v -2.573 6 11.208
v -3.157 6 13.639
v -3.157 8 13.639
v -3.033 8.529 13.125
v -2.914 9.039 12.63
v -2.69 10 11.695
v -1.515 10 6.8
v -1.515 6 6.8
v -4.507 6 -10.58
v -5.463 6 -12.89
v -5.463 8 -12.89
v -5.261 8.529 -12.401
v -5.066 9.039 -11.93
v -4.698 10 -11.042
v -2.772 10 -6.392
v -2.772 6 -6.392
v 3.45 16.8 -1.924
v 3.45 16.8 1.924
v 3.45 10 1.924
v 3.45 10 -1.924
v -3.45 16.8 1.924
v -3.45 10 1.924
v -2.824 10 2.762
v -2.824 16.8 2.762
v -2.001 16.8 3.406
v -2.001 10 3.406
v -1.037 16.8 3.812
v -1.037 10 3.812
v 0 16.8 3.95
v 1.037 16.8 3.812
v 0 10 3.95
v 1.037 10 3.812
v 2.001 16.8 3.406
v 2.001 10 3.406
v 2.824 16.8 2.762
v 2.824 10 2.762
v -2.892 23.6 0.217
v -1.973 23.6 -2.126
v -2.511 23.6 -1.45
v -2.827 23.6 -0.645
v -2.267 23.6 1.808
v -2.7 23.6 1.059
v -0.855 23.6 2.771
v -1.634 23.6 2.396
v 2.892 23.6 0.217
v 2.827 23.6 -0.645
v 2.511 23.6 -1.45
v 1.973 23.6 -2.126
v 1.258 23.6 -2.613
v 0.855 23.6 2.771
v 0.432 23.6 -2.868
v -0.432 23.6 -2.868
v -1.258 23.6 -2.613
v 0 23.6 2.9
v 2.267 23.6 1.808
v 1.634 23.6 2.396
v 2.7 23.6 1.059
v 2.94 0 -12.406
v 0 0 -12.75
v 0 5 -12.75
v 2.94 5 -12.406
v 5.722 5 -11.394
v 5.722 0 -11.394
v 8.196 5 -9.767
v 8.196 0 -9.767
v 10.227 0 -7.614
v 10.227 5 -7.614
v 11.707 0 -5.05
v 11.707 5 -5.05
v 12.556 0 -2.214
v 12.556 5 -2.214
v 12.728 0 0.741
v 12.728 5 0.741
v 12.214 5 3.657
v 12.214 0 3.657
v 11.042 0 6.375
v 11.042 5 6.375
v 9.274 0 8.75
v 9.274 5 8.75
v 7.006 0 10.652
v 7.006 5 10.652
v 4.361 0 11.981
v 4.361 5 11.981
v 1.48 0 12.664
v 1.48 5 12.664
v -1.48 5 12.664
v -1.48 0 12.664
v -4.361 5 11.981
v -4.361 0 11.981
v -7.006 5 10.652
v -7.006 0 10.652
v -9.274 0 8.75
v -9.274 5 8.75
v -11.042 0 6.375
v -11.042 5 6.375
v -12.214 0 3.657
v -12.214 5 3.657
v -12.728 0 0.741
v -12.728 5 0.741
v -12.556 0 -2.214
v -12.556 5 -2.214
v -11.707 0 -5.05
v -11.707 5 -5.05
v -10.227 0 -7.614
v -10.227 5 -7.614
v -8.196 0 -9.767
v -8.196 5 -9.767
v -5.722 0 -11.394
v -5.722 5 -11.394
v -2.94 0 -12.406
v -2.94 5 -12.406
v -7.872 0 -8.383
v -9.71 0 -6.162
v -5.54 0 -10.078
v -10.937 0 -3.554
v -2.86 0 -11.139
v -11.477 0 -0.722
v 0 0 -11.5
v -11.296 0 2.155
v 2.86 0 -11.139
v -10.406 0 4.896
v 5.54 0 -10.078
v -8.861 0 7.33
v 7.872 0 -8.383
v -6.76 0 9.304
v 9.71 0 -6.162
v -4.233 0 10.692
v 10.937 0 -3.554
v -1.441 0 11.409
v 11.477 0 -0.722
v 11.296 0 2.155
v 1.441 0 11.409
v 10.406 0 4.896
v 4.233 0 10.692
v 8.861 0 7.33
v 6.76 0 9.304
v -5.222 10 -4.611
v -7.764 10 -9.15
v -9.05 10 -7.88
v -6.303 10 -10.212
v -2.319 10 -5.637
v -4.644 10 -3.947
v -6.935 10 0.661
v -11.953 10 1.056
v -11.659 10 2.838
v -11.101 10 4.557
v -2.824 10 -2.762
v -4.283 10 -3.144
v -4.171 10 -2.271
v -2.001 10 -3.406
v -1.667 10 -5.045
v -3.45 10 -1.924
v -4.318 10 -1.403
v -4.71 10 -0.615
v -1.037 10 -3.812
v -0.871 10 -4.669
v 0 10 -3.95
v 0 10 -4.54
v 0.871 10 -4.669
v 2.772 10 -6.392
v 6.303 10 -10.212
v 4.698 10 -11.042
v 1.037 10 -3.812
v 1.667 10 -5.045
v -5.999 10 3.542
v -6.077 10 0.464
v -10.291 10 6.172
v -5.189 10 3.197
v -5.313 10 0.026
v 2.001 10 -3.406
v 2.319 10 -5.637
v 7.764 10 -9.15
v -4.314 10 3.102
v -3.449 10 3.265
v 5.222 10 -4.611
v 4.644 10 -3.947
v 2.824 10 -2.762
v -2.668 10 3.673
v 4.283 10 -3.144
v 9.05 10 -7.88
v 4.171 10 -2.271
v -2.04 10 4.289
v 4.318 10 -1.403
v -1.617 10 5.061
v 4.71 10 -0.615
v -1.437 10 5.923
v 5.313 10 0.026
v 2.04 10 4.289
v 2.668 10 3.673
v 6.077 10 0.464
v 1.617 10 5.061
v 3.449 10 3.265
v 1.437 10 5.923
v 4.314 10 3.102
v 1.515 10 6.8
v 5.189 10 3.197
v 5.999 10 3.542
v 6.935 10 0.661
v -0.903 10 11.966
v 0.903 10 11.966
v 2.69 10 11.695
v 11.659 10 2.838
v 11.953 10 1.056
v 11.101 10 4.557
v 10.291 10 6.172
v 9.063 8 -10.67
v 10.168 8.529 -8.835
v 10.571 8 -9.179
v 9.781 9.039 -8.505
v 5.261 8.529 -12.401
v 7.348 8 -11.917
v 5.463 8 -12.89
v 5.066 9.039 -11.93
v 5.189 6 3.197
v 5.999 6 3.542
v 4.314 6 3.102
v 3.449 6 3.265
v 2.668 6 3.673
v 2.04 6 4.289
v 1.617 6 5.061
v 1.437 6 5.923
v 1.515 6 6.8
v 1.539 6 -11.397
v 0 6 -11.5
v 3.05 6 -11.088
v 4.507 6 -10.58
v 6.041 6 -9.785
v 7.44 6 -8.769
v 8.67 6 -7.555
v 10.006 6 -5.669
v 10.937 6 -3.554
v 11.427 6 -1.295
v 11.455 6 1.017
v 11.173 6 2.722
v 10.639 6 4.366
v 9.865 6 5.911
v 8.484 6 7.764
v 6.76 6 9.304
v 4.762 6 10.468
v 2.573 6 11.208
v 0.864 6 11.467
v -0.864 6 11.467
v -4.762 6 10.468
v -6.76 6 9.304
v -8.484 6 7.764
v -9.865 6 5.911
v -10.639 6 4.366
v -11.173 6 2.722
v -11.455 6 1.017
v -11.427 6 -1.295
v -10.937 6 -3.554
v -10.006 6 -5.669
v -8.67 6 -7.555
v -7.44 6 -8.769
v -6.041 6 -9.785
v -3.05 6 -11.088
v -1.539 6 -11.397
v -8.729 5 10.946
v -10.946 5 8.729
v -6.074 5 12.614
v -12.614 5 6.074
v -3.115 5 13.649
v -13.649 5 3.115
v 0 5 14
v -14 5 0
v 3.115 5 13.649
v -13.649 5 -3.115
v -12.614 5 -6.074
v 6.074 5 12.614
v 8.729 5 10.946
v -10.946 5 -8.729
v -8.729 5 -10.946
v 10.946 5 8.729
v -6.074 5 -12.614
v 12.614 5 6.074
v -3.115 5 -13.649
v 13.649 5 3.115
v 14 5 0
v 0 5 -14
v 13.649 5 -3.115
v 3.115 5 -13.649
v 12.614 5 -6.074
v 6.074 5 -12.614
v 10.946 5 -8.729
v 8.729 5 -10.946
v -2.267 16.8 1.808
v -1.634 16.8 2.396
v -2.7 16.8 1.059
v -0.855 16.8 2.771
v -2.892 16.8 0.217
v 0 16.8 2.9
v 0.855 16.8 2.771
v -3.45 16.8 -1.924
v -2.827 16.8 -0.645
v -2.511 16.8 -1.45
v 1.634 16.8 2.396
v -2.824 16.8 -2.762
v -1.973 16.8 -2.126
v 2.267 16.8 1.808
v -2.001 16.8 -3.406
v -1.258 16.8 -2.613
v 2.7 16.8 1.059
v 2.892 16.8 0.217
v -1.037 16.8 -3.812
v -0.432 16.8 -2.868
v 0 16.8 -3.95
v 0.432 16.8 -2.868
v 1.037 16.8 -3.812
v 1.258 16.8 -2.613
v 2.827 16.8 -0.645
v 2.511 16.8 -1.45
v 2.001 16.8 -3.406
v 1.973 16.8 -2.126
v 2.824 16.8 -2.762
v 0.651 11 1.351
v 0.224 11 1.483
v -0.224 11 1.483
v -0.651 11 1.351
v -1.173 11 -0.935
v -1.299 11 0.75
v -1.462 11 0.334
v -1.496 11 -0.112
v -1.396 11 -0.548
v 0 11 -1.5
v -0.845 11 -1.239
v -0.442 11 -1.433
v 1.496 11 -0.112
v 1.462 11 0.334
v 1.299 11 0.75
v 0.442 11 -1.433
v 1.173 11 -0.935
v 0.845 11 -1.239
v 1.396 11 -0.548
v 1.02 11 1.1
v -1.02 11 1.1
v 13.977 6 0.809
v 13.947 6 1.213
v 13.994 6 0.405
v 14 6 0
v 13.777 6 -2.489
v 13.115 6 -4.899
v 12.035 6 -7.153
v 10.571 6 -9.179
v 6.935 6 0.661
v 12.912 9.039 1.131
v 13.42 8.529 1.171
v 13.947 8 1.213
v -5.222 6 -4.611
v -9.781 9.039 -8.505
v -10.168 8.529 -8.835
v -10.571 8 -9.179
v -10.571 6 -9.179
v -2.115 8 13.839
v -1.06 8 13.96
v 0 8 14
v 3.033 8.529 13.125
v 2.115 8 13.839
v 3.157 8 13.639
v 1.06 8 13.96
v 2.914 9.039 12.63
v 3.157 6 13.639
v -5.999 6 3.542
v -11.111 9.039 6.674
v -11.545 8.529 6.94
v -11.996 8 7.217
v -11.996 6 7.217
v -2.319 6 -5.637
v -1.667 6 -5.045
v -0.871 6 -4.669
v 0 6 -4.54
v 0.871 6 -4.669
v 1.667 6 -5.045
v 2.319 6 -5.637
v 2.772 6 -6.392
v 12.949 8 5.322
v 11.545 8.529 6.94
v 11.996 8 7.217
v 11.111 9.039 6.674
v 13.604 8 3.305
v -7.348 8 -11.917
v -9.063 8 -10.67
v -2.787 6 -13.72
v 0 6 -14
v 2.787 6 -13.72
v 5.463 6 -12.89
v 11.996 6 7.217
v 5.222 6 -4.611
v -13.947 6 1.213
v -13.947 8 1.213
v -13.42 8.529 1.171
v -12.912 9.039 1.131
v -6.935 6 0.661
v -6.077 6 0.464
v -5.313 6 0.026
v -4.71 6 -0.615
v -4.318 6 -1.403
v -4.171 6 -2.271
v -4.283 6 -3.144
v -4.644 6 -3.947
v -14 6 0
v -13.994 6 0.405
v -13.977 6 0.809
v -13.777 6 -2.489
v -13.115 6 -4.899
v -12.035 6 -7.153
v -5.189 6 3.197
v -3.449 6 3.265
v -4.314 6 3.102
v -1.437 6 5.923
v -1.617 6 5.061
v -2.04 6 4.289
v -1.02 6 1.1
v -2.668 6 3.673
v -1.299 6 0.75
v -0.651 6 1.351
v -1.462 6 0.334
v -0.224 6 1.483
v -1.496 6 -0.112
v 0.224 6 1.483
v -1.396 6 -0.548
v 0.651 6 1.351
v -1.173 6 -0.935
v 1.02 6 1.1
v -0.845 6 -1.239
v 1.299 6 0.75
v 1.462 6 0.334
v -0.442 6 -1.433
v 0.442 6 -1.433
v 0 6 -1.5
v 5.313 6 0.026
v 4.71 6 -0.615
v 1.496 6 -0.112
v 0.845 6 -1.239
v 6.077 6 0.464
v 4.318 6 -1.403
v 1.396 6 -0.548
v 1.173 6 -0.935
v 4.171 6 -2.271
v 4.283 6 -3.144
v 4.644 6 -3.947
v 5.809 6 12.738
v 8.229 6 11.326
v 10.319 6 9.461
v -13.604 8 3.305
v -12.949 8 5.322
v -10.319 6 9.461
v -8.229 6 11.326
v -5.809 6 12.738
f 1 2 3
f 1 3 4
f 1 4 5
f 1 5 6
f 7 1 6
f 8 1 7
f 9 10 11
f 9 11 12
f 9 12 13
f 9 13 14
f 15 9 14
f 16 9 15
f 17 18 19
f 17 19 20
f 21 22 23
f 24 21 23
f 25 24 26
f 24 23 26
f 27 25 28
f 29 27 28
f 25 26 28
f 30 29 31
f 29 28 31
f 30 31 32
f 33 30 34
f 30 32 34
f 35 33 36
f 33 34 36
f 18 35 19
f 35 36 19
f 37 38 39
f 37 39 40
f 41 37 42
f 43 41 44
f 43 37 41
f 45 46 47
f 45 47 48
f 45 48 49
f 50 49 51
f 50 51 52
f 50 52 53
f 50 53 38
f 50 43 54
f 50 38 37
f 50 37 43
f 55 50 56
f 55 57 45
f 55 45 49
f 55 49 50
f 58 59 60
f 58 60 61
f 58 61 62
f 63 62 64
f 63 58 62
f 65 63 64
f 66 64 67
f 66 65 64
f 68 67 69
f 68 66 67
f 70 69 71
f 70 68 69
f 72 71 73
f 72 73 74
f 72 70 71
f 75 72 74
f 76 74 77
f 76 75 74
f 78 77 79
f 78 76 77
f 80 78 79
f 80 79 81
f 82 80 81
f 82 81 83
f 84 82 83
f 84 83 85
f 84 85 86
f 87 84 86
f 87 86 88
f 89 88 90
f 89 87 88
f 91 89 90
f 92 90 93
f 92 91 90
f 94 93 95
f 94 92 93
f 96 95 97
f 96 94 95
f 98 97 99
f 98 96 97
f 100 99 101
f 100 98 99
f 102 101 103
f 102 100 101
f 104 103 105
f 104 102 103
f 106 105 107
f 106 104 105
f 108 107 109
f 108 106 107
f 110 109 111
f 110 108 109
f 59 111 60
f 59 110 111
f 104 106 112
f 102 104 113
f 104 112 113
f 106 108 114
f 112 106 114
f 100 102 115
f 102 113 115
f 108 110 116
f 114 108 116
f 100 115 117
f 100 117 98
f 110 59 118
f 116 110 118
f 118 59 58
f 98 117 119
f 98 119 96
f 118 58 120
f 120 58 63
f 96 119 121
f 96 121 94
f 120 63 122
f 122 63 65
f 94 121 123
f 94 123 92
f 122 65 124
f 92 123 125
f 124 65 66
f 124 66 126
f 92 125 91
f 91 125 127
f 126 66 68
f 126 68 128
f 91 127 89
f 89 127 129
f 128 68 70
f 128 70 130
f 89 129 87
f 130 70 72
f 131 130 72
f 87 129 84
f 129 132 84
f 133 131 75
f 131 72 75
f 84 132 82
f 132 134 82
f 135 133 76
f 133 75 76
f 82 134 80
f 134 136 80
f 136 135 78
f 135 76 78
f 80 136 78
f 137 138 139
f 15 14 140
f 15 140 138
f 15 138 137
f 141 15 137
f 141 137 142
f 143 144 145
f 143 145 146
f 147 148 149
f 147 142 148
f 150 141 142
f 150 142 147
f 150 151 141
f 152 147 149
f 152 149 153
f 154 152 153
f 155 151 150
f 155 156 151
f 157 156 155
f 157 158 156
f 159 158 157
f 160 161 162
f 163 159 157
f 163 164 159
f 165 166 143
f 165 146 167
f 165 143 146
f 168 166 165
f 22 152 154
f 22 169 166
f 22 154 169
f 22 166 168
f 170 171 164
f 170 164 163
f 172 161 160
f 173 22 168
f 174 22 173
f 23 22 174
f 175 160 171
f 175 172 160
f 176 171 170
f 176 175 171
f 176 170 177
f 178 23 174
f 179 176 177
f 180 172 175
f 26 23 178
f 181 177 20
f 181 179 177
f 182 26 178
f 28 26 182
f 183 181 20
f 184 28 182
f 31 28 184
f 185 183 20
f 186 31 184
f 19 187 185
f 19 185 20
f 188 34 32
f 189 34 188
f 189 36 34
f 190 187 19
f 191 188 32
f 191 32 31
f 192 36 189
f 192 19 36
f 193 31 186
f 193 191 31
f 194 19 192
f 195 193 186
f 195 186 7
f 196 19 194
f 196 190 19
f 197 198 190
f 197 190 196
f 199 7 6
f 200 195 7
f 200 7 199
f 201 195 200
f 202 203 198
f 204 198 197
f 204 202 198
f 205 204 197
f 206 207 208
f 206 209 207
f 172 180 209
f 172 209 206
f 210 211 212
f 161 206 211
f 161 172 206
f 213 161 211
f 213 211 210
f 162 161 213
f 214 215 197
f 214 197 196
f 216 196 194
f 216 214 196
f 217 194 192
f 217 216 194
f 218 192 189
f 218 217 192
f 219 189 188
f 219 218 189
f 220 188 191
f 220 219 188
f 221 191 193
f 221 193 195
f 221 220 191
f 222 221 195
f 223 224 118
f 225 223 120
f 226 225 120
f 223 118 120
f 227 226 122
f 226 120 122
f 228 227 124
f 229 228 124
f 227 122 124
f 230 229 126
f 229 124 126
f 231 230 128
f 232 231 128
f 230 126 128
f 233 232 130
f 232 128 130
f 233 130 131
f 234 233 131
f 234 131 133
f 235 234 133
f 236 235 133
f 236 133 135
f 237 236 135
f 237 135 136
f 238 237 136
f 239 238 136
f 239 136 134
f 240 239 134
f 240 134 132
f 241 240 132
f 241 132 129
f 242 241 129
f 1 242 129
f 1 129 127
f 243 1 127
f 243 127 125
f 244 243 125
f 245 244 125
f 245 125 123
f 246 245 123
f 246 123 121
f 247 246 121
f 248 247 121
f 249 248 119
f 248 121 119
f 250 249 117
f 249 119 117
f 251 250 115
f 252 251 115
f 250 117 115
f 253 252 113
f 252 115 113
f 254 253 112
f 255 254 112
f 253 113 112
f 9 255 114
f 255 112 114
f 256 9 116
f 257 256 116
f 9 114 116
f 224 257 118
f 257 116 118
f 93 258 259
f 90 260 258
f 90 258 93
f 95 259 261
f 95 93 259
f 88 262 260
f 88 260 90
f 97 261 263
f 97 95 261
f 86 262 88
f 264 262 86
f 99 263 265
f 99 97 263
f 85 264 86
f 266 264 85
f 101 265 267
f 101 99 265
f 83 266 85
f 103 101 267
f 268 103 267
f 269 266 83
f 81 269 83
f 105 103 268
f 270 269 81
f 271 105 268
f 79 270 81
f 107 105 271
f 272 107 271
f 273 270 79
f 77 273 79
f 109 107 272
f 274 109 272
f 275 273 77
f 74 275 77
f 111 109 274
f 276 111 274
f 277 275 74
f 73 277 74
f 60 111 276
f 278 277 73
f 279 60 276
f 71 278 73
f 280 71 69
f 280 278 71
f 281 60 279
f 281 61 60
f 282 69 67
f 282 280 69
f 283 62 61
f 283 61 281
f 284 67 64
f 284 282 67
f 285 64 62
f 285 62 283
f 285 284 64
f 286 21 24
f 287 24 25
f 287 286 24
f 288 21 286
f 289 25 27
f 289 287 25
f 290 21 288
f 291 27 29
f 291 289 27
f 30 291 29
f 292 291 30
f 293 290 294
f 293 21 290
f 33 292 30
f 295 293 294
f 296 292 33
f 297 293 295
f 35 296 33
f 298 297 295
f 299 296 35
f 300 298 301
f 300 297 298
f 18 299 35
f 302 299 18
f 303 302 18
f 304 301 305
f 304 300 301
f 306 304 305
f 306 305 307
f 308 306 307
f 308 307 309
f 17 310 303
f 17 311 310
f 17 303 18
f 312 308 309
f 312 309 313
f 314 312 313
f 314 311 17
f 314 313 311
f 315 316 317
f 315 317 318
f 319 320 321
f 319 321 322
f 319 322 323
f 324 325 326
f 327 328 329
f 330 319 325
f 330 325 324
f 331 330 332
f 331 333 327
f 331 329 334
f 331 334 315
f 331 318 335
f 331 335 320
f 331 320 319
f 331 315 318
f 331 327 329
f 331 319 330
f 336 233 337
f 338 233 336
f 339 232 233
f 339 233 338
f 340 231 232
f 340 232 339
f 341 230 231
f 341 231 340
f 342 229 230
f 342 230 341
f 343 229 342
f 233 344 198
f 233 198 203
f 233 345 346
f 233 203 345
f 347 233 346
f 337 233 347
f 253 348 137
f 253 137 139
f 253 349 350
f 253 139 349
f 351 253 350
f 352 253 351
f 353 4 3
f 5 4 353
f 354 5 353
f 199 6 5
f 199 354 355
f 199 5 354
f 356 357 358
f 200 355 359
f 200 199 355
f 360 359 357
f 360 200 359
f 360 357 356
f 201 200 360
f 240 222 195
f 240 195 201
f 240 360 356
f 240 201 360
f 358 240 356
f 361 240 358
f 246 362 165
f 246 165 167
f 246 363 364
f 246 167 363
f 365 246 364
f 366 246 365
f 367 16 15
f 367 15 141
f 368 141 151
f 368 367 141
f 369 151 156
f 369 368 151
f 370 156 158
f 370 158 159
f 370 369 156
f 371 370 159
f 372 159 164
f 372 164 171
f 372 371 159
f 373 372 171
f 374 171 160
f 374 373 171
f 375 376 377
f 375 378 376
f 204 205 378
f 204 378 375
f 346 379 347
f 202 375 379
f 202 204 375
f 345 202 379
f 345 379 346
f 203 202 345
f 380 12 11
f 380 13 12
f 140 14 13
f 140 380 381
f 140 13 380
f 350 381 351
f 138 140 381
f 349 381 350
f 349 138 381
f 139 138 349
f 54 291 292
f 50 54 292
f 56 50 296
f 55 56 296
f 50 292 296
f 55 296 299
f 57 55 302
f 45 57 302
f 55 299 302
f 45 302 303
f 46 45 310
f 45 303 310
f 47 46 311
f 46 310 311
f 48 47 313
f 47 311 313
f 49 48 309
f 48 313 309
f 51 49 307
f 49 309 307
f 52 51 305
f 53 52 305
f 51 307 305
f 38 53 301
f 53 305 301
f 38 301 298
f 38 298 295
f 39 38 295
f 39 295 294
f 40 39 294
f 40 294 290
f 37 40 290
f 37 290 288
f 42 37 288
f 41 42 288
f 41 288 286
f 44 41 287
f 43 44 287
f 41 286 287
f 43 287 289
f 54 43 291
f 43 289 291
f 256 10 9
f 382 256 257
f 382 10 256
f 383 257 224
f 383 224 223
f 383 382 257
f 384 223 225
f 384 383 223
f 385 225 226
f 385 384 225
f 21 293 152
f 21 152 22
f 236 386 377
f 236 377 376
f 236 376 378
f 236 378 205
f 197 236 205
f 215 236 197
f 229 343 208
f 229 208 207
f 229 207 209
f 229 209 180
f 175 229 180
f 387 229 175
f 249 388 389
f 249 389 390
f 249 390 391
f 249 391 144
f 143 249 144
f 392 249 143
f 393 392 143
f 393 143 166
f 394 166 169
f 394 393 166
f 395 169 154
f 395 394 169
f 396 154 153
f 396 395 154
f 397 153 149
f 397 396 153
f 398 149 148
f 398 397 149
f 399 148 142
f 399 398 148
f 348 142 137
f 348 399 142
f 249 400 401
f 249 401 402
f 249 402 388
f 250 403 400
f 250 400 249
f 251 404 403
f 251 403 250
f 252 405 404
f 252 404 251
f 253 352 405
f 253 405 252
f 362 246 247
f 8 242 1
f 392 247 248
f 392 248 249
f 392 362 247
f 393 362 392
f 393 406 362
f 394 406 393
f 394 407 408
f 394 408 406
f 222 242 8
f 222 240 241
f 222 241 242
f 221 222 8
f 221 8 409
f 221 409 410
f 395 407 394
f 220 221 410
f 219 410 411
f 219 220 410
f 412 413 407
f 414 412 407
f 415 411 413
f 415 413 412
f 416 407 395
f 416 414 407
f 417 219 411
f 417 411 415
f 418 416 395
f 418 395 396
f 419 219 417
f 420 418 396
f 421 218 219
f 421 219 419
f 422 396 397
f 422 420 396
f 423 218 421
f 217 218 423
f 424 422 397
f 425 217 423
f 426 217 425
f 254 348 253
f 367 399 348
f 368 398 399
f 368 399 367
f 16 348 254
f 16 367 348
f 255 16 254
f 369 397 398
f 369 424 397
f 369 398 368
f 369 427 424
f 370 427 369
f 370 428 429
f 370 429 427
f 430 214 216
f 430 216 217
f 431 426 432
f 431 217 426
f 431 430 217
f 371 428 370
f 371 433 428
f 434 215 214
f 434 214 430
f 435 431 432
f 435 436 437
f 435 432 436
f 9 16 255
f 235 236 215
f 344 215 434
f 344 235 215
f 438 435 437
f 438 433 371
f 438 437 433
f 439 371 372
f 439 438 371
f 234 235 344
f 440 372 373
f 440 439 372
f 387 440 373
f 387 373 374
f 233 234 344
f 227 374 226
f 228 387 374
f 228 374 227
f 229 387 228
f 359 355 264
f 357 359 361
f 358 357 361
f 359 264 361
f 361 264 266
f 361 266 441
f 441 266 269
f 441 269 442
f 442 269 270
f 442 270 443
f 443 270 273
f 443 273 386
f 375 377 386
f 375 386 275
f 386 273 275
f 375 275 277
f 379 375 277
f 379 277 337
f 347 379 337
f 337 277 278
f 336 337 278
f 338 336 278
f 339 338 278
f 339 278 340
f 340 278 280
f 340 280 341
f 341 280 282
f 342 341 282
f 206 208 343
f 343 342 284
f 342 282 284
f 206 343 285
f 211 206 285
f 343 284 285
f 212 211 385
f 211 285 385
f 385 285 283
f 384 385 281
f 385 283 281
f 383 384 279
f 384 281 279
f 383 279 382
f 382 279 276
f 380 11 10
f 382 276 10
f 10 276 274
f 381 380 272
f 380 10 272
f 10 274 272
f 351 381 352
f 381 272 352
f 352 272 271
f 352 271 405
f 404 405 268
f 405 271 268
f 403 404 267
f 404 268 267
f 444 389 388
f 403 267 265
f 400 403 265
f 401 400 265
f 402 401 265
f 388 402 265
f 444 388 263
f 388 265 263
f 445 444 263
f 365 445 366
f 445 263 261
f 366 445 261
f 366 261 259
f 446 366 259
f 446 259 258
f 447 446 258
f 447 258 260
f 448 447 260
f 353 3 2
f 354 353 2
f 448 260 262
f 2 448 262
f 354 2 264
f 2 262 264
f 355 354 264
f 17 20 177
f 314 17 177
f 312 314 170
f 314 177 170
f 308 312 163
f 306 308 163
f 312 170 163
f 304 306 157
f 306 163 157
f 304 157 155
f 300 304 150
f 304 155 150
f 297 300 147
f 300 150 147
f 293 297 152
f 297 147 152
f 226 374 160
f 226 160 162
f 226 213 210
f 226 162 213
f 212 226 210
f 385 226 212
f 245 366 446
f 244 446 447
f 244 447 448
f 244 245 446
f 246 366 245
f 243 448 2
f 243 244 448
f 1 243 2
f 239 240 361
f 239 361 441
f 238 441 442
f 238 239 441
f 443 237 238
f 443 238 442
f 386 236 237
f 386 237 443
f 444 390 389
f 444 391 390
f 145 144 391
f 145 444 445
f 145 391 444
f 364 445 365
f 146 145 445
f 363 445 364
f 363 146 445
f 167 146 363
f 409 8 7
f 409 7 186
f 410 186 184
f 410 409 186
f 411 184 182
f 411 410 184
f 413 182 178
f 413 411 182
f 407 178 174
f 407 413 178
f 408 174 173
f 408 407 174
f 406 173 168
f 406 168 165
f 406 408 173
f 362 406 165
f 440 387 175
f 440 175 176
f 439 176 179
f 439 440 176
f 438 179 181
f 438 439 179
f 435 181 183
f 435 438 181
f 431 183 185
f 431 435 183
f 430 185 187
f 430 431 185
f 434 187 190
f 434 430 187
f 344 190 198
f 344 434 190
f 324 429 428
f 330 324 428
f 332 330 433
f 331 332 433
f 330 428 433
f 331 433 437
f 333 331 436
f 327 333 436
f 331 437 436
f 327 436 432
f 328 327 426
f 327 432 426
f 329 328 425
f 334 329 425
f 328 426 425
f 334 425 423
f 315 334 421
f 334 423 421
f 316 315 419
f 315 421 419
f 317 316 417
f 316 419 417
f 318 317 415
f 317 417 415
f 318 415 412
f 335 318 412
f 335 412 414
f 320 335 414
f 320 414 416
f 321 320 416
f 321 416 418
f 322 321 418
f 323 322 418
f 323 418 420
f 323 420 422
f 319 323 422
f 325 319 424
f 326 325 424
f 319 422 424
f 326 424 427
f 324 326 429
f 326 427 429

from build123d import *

# Parameters (mm, degrees)
SKETCH_1_R          = 14
EXTRUDE_1_DEPTH     = 10
SKETCH_2_R          = 11.5
CUT_EXTRUDE_1_DEPTH = 6
SKETCH_3_R          = 14
SKETCH_3_R_2        = 12.75
CUT_EXTRUDE_2_DEPTH = 5
CUT_EXTRUDE_START   = -4
CUT_EXTRUDE_3_DEPTH = 4
CHAMFER_1_SIZE      = 2
EXTRUDE_2_DEPTH     = 6.8
SKETCH_6_R          = 2.9
EXTRUDE_3_DEPTH     = 6.8
SKETCH_7_R          = 1.5
CUT_EXTRUDE_4_DEPTH = 5


with BuildPart() as part:
    # 草图1 → 凸台-拉伸1 (new body)
    with BuildSketch(Plane(origin=(0, 0, 0), x_dir=(1, 0, 0), z_dir=(0, 1, 0))):
        with Locations(Location((0, 0, 0), (0, 0, 270))):
            Circle(SKETCH_1_R)
    extrude(amount=EXTRUDE_1_DEPTH)

    # 草图2 → 切除-拉伸1 (cut)
    with BuildSketch(Plane.XZ):
        with Locations(Location((0, 0, 0), (0, 0, 270))):
            Circle(SKETCH_2_R)
    extrude(amount=-CUT_EXTRUDE_1_DEPTH, mode=Mode.SUBTRACT)

    # 草图3 → 切除-拉伸2 (cut)
    with BuildSketch(Plane.XZ):
        with Locations(Location((0, 0, 0), (0, 0, 270))):
            Circle(SKETCH_3_R)
        with Locations(Location((0, 0, 0), (0, 0, 270))):
            Circle(SKETCH_3_R_2, mode=Mode.SUBTRACT)
    extrude(amount=-CUT_EXTRUDE_2_DEPTH, mode=Mode.SUBTRACT)

    # 草图4 → 切除-拉伸3 (cut)
    with BuildSketch(Plane(origin=(0, 10, 0), x_dir=(1, 0, 0), z_dir=(0, 1, 0)).offset(CUT_EXTRUDE_START)):
        with BuildLine():
            Line((-5.46333165, 12.889996403), (-2.771638598, 6.39167453))
            ThreePointArc((-2.771638598, 6.39167453), (0, 4.539724827), (2.771638598, 6.39167453))
            Line((2.771638598, 6.39167453), (5.46333165, 12.889996403))
            ThreePointArc((5.46333165, 12.889996403), (0, 14), (-5.46333165, 12.889996403))
        make_face()
        with BuildLine():
            Line((-5.222360283, 4.611121001), (-10.570852749, 9.179165113))
            ThreePointArc((-10.570852749, 9.179165113), (-13.114723376, 4.899390856), (-14, 0))
            ThreePointArc((-14, 0), (-13.986838163, -0.6069252), (-13.9473774, -1.212709221))
            Line((-13.9473774, -1.212709221), (-6.935327141, -0.660848897))
            ThreePointArc((-6.935327141, -0.660848897), (-4.317534879, 1.402852121), (-5.222360283, 4.611121001))
        make_face()
        with BuildLine():
            Line((-5.999234754, -3.541845025), (-11.996477939, -7.216960375))
            ThreePointArc((-11.996477939, -7.216960375), (-8.228993532, -11.326237921), (-3.156621637, -13.63949192))
            Line((-3.156621637, -13.63949192), (-1.514629298, -6.800101609))
            ThreePointArc((-1.514629298, -6.800101609), (-2.668383303, -3.672714535), (-5.999234754, -3.541845025))
        make_face()
        with BuildLine():
            ThreePointArc((3.156621637, -13.63949192), (8.228993532, -11.326237921), (11.996477939, -7.216960375))
            Line((11.996477939, -7.216960375), (5.999234754, -3.541845025))
            ThreePointArc((5.999234754, -3.541845025), (2.668383303, -3.672714535), (1.514629298, -6.800101609))
            Line((1.514629298, -6.800101609), (3.156621637, -13.63949192))
        make_face()
        with BuildLine():
            ThreePointArc((14, 0), (13.114723376, 4.899390856), (10.570852749, 9.179165113))
            Line((10.570852749, 9.179165113), (5.222360283, 4.611121001))
            ThreePointArc((5.222360283, 4.611121001), (4.317534879, 1.402852121), (6.935327141, -0.660848897))
            Line((6.935327141, -0.660848897), (13.9473774, -1.212709221))
            ThreePointArc((13.9473774, -1.212709221), (13.986838163, -0.6069252), (14, 0))
        make_face()
    extrude(amount=CUT_EXTRUDE_3_DEPTH, mode=Mode.SUBTRACT)

    # 倒角1
    chamfer_1_edges = [part.edges().sort_by_distance(p)[0] for p in [
        (-8.228993532, 10, -11.326237921),
        (-13.314791228, 10, 4.326237921),
        (1.588570602, 10, 13.909580994),
        (13.314791228, 10, 4.326237921),
        (8.228993532, 10, -11.326237921),
    ]]
    chamfer(chamfer_1_edges, length=CHAMFER_1_SIZE)

    # 草图5 → 凸台-拉伸2 (add)
    with BuildSketch(Plane(origin=(0, 10, 0), x_dir=(1, 0, 0), z_dir=(0, 1, 0))):
        with BuildLine():
            Line((-3.45, 1.923538406), (-3.45, -1.923538406))
            ThreePointArc((-3.45, -1.923538406), (0, -3.95), (3.45, -1.923538406))
            Line((3.45, -1.923538406), (3.45, 1.923538406))
            ThreePointArc((3.45, 1.923538406), (0, 3.95), (-3.45, 1.923538406))
        make_face()
    extrude(amount=EXTRUDE_2_DEPTH)

    # 草图6 → 凸台-拉伸3 (add)
    with BuildSketch(Plane(origin=(0, 16.8, 0), x_dir=(1, 0, 0), z_dir=(0, 1, 0))):
        with Locations(Location((0, 0, 0), (0, 0, 270))):
            Circle(SKETCH_6_R)
    extrude(amount=EXTRUDE_3_DEPTH)

    # 草图7 → 切除-拉伸4 (cut)
    with BuildSketch(Plane.XZ.offset(-6)):
        with Locations(Location((0, 0, 0), (0, 0, 270))):
            Circle(SKETCH_7_R)
    extrude(amount=-CUT_EXTRUDE_4_DEPTH, mode=Mode.SUBTRACT)


solid = part.part
